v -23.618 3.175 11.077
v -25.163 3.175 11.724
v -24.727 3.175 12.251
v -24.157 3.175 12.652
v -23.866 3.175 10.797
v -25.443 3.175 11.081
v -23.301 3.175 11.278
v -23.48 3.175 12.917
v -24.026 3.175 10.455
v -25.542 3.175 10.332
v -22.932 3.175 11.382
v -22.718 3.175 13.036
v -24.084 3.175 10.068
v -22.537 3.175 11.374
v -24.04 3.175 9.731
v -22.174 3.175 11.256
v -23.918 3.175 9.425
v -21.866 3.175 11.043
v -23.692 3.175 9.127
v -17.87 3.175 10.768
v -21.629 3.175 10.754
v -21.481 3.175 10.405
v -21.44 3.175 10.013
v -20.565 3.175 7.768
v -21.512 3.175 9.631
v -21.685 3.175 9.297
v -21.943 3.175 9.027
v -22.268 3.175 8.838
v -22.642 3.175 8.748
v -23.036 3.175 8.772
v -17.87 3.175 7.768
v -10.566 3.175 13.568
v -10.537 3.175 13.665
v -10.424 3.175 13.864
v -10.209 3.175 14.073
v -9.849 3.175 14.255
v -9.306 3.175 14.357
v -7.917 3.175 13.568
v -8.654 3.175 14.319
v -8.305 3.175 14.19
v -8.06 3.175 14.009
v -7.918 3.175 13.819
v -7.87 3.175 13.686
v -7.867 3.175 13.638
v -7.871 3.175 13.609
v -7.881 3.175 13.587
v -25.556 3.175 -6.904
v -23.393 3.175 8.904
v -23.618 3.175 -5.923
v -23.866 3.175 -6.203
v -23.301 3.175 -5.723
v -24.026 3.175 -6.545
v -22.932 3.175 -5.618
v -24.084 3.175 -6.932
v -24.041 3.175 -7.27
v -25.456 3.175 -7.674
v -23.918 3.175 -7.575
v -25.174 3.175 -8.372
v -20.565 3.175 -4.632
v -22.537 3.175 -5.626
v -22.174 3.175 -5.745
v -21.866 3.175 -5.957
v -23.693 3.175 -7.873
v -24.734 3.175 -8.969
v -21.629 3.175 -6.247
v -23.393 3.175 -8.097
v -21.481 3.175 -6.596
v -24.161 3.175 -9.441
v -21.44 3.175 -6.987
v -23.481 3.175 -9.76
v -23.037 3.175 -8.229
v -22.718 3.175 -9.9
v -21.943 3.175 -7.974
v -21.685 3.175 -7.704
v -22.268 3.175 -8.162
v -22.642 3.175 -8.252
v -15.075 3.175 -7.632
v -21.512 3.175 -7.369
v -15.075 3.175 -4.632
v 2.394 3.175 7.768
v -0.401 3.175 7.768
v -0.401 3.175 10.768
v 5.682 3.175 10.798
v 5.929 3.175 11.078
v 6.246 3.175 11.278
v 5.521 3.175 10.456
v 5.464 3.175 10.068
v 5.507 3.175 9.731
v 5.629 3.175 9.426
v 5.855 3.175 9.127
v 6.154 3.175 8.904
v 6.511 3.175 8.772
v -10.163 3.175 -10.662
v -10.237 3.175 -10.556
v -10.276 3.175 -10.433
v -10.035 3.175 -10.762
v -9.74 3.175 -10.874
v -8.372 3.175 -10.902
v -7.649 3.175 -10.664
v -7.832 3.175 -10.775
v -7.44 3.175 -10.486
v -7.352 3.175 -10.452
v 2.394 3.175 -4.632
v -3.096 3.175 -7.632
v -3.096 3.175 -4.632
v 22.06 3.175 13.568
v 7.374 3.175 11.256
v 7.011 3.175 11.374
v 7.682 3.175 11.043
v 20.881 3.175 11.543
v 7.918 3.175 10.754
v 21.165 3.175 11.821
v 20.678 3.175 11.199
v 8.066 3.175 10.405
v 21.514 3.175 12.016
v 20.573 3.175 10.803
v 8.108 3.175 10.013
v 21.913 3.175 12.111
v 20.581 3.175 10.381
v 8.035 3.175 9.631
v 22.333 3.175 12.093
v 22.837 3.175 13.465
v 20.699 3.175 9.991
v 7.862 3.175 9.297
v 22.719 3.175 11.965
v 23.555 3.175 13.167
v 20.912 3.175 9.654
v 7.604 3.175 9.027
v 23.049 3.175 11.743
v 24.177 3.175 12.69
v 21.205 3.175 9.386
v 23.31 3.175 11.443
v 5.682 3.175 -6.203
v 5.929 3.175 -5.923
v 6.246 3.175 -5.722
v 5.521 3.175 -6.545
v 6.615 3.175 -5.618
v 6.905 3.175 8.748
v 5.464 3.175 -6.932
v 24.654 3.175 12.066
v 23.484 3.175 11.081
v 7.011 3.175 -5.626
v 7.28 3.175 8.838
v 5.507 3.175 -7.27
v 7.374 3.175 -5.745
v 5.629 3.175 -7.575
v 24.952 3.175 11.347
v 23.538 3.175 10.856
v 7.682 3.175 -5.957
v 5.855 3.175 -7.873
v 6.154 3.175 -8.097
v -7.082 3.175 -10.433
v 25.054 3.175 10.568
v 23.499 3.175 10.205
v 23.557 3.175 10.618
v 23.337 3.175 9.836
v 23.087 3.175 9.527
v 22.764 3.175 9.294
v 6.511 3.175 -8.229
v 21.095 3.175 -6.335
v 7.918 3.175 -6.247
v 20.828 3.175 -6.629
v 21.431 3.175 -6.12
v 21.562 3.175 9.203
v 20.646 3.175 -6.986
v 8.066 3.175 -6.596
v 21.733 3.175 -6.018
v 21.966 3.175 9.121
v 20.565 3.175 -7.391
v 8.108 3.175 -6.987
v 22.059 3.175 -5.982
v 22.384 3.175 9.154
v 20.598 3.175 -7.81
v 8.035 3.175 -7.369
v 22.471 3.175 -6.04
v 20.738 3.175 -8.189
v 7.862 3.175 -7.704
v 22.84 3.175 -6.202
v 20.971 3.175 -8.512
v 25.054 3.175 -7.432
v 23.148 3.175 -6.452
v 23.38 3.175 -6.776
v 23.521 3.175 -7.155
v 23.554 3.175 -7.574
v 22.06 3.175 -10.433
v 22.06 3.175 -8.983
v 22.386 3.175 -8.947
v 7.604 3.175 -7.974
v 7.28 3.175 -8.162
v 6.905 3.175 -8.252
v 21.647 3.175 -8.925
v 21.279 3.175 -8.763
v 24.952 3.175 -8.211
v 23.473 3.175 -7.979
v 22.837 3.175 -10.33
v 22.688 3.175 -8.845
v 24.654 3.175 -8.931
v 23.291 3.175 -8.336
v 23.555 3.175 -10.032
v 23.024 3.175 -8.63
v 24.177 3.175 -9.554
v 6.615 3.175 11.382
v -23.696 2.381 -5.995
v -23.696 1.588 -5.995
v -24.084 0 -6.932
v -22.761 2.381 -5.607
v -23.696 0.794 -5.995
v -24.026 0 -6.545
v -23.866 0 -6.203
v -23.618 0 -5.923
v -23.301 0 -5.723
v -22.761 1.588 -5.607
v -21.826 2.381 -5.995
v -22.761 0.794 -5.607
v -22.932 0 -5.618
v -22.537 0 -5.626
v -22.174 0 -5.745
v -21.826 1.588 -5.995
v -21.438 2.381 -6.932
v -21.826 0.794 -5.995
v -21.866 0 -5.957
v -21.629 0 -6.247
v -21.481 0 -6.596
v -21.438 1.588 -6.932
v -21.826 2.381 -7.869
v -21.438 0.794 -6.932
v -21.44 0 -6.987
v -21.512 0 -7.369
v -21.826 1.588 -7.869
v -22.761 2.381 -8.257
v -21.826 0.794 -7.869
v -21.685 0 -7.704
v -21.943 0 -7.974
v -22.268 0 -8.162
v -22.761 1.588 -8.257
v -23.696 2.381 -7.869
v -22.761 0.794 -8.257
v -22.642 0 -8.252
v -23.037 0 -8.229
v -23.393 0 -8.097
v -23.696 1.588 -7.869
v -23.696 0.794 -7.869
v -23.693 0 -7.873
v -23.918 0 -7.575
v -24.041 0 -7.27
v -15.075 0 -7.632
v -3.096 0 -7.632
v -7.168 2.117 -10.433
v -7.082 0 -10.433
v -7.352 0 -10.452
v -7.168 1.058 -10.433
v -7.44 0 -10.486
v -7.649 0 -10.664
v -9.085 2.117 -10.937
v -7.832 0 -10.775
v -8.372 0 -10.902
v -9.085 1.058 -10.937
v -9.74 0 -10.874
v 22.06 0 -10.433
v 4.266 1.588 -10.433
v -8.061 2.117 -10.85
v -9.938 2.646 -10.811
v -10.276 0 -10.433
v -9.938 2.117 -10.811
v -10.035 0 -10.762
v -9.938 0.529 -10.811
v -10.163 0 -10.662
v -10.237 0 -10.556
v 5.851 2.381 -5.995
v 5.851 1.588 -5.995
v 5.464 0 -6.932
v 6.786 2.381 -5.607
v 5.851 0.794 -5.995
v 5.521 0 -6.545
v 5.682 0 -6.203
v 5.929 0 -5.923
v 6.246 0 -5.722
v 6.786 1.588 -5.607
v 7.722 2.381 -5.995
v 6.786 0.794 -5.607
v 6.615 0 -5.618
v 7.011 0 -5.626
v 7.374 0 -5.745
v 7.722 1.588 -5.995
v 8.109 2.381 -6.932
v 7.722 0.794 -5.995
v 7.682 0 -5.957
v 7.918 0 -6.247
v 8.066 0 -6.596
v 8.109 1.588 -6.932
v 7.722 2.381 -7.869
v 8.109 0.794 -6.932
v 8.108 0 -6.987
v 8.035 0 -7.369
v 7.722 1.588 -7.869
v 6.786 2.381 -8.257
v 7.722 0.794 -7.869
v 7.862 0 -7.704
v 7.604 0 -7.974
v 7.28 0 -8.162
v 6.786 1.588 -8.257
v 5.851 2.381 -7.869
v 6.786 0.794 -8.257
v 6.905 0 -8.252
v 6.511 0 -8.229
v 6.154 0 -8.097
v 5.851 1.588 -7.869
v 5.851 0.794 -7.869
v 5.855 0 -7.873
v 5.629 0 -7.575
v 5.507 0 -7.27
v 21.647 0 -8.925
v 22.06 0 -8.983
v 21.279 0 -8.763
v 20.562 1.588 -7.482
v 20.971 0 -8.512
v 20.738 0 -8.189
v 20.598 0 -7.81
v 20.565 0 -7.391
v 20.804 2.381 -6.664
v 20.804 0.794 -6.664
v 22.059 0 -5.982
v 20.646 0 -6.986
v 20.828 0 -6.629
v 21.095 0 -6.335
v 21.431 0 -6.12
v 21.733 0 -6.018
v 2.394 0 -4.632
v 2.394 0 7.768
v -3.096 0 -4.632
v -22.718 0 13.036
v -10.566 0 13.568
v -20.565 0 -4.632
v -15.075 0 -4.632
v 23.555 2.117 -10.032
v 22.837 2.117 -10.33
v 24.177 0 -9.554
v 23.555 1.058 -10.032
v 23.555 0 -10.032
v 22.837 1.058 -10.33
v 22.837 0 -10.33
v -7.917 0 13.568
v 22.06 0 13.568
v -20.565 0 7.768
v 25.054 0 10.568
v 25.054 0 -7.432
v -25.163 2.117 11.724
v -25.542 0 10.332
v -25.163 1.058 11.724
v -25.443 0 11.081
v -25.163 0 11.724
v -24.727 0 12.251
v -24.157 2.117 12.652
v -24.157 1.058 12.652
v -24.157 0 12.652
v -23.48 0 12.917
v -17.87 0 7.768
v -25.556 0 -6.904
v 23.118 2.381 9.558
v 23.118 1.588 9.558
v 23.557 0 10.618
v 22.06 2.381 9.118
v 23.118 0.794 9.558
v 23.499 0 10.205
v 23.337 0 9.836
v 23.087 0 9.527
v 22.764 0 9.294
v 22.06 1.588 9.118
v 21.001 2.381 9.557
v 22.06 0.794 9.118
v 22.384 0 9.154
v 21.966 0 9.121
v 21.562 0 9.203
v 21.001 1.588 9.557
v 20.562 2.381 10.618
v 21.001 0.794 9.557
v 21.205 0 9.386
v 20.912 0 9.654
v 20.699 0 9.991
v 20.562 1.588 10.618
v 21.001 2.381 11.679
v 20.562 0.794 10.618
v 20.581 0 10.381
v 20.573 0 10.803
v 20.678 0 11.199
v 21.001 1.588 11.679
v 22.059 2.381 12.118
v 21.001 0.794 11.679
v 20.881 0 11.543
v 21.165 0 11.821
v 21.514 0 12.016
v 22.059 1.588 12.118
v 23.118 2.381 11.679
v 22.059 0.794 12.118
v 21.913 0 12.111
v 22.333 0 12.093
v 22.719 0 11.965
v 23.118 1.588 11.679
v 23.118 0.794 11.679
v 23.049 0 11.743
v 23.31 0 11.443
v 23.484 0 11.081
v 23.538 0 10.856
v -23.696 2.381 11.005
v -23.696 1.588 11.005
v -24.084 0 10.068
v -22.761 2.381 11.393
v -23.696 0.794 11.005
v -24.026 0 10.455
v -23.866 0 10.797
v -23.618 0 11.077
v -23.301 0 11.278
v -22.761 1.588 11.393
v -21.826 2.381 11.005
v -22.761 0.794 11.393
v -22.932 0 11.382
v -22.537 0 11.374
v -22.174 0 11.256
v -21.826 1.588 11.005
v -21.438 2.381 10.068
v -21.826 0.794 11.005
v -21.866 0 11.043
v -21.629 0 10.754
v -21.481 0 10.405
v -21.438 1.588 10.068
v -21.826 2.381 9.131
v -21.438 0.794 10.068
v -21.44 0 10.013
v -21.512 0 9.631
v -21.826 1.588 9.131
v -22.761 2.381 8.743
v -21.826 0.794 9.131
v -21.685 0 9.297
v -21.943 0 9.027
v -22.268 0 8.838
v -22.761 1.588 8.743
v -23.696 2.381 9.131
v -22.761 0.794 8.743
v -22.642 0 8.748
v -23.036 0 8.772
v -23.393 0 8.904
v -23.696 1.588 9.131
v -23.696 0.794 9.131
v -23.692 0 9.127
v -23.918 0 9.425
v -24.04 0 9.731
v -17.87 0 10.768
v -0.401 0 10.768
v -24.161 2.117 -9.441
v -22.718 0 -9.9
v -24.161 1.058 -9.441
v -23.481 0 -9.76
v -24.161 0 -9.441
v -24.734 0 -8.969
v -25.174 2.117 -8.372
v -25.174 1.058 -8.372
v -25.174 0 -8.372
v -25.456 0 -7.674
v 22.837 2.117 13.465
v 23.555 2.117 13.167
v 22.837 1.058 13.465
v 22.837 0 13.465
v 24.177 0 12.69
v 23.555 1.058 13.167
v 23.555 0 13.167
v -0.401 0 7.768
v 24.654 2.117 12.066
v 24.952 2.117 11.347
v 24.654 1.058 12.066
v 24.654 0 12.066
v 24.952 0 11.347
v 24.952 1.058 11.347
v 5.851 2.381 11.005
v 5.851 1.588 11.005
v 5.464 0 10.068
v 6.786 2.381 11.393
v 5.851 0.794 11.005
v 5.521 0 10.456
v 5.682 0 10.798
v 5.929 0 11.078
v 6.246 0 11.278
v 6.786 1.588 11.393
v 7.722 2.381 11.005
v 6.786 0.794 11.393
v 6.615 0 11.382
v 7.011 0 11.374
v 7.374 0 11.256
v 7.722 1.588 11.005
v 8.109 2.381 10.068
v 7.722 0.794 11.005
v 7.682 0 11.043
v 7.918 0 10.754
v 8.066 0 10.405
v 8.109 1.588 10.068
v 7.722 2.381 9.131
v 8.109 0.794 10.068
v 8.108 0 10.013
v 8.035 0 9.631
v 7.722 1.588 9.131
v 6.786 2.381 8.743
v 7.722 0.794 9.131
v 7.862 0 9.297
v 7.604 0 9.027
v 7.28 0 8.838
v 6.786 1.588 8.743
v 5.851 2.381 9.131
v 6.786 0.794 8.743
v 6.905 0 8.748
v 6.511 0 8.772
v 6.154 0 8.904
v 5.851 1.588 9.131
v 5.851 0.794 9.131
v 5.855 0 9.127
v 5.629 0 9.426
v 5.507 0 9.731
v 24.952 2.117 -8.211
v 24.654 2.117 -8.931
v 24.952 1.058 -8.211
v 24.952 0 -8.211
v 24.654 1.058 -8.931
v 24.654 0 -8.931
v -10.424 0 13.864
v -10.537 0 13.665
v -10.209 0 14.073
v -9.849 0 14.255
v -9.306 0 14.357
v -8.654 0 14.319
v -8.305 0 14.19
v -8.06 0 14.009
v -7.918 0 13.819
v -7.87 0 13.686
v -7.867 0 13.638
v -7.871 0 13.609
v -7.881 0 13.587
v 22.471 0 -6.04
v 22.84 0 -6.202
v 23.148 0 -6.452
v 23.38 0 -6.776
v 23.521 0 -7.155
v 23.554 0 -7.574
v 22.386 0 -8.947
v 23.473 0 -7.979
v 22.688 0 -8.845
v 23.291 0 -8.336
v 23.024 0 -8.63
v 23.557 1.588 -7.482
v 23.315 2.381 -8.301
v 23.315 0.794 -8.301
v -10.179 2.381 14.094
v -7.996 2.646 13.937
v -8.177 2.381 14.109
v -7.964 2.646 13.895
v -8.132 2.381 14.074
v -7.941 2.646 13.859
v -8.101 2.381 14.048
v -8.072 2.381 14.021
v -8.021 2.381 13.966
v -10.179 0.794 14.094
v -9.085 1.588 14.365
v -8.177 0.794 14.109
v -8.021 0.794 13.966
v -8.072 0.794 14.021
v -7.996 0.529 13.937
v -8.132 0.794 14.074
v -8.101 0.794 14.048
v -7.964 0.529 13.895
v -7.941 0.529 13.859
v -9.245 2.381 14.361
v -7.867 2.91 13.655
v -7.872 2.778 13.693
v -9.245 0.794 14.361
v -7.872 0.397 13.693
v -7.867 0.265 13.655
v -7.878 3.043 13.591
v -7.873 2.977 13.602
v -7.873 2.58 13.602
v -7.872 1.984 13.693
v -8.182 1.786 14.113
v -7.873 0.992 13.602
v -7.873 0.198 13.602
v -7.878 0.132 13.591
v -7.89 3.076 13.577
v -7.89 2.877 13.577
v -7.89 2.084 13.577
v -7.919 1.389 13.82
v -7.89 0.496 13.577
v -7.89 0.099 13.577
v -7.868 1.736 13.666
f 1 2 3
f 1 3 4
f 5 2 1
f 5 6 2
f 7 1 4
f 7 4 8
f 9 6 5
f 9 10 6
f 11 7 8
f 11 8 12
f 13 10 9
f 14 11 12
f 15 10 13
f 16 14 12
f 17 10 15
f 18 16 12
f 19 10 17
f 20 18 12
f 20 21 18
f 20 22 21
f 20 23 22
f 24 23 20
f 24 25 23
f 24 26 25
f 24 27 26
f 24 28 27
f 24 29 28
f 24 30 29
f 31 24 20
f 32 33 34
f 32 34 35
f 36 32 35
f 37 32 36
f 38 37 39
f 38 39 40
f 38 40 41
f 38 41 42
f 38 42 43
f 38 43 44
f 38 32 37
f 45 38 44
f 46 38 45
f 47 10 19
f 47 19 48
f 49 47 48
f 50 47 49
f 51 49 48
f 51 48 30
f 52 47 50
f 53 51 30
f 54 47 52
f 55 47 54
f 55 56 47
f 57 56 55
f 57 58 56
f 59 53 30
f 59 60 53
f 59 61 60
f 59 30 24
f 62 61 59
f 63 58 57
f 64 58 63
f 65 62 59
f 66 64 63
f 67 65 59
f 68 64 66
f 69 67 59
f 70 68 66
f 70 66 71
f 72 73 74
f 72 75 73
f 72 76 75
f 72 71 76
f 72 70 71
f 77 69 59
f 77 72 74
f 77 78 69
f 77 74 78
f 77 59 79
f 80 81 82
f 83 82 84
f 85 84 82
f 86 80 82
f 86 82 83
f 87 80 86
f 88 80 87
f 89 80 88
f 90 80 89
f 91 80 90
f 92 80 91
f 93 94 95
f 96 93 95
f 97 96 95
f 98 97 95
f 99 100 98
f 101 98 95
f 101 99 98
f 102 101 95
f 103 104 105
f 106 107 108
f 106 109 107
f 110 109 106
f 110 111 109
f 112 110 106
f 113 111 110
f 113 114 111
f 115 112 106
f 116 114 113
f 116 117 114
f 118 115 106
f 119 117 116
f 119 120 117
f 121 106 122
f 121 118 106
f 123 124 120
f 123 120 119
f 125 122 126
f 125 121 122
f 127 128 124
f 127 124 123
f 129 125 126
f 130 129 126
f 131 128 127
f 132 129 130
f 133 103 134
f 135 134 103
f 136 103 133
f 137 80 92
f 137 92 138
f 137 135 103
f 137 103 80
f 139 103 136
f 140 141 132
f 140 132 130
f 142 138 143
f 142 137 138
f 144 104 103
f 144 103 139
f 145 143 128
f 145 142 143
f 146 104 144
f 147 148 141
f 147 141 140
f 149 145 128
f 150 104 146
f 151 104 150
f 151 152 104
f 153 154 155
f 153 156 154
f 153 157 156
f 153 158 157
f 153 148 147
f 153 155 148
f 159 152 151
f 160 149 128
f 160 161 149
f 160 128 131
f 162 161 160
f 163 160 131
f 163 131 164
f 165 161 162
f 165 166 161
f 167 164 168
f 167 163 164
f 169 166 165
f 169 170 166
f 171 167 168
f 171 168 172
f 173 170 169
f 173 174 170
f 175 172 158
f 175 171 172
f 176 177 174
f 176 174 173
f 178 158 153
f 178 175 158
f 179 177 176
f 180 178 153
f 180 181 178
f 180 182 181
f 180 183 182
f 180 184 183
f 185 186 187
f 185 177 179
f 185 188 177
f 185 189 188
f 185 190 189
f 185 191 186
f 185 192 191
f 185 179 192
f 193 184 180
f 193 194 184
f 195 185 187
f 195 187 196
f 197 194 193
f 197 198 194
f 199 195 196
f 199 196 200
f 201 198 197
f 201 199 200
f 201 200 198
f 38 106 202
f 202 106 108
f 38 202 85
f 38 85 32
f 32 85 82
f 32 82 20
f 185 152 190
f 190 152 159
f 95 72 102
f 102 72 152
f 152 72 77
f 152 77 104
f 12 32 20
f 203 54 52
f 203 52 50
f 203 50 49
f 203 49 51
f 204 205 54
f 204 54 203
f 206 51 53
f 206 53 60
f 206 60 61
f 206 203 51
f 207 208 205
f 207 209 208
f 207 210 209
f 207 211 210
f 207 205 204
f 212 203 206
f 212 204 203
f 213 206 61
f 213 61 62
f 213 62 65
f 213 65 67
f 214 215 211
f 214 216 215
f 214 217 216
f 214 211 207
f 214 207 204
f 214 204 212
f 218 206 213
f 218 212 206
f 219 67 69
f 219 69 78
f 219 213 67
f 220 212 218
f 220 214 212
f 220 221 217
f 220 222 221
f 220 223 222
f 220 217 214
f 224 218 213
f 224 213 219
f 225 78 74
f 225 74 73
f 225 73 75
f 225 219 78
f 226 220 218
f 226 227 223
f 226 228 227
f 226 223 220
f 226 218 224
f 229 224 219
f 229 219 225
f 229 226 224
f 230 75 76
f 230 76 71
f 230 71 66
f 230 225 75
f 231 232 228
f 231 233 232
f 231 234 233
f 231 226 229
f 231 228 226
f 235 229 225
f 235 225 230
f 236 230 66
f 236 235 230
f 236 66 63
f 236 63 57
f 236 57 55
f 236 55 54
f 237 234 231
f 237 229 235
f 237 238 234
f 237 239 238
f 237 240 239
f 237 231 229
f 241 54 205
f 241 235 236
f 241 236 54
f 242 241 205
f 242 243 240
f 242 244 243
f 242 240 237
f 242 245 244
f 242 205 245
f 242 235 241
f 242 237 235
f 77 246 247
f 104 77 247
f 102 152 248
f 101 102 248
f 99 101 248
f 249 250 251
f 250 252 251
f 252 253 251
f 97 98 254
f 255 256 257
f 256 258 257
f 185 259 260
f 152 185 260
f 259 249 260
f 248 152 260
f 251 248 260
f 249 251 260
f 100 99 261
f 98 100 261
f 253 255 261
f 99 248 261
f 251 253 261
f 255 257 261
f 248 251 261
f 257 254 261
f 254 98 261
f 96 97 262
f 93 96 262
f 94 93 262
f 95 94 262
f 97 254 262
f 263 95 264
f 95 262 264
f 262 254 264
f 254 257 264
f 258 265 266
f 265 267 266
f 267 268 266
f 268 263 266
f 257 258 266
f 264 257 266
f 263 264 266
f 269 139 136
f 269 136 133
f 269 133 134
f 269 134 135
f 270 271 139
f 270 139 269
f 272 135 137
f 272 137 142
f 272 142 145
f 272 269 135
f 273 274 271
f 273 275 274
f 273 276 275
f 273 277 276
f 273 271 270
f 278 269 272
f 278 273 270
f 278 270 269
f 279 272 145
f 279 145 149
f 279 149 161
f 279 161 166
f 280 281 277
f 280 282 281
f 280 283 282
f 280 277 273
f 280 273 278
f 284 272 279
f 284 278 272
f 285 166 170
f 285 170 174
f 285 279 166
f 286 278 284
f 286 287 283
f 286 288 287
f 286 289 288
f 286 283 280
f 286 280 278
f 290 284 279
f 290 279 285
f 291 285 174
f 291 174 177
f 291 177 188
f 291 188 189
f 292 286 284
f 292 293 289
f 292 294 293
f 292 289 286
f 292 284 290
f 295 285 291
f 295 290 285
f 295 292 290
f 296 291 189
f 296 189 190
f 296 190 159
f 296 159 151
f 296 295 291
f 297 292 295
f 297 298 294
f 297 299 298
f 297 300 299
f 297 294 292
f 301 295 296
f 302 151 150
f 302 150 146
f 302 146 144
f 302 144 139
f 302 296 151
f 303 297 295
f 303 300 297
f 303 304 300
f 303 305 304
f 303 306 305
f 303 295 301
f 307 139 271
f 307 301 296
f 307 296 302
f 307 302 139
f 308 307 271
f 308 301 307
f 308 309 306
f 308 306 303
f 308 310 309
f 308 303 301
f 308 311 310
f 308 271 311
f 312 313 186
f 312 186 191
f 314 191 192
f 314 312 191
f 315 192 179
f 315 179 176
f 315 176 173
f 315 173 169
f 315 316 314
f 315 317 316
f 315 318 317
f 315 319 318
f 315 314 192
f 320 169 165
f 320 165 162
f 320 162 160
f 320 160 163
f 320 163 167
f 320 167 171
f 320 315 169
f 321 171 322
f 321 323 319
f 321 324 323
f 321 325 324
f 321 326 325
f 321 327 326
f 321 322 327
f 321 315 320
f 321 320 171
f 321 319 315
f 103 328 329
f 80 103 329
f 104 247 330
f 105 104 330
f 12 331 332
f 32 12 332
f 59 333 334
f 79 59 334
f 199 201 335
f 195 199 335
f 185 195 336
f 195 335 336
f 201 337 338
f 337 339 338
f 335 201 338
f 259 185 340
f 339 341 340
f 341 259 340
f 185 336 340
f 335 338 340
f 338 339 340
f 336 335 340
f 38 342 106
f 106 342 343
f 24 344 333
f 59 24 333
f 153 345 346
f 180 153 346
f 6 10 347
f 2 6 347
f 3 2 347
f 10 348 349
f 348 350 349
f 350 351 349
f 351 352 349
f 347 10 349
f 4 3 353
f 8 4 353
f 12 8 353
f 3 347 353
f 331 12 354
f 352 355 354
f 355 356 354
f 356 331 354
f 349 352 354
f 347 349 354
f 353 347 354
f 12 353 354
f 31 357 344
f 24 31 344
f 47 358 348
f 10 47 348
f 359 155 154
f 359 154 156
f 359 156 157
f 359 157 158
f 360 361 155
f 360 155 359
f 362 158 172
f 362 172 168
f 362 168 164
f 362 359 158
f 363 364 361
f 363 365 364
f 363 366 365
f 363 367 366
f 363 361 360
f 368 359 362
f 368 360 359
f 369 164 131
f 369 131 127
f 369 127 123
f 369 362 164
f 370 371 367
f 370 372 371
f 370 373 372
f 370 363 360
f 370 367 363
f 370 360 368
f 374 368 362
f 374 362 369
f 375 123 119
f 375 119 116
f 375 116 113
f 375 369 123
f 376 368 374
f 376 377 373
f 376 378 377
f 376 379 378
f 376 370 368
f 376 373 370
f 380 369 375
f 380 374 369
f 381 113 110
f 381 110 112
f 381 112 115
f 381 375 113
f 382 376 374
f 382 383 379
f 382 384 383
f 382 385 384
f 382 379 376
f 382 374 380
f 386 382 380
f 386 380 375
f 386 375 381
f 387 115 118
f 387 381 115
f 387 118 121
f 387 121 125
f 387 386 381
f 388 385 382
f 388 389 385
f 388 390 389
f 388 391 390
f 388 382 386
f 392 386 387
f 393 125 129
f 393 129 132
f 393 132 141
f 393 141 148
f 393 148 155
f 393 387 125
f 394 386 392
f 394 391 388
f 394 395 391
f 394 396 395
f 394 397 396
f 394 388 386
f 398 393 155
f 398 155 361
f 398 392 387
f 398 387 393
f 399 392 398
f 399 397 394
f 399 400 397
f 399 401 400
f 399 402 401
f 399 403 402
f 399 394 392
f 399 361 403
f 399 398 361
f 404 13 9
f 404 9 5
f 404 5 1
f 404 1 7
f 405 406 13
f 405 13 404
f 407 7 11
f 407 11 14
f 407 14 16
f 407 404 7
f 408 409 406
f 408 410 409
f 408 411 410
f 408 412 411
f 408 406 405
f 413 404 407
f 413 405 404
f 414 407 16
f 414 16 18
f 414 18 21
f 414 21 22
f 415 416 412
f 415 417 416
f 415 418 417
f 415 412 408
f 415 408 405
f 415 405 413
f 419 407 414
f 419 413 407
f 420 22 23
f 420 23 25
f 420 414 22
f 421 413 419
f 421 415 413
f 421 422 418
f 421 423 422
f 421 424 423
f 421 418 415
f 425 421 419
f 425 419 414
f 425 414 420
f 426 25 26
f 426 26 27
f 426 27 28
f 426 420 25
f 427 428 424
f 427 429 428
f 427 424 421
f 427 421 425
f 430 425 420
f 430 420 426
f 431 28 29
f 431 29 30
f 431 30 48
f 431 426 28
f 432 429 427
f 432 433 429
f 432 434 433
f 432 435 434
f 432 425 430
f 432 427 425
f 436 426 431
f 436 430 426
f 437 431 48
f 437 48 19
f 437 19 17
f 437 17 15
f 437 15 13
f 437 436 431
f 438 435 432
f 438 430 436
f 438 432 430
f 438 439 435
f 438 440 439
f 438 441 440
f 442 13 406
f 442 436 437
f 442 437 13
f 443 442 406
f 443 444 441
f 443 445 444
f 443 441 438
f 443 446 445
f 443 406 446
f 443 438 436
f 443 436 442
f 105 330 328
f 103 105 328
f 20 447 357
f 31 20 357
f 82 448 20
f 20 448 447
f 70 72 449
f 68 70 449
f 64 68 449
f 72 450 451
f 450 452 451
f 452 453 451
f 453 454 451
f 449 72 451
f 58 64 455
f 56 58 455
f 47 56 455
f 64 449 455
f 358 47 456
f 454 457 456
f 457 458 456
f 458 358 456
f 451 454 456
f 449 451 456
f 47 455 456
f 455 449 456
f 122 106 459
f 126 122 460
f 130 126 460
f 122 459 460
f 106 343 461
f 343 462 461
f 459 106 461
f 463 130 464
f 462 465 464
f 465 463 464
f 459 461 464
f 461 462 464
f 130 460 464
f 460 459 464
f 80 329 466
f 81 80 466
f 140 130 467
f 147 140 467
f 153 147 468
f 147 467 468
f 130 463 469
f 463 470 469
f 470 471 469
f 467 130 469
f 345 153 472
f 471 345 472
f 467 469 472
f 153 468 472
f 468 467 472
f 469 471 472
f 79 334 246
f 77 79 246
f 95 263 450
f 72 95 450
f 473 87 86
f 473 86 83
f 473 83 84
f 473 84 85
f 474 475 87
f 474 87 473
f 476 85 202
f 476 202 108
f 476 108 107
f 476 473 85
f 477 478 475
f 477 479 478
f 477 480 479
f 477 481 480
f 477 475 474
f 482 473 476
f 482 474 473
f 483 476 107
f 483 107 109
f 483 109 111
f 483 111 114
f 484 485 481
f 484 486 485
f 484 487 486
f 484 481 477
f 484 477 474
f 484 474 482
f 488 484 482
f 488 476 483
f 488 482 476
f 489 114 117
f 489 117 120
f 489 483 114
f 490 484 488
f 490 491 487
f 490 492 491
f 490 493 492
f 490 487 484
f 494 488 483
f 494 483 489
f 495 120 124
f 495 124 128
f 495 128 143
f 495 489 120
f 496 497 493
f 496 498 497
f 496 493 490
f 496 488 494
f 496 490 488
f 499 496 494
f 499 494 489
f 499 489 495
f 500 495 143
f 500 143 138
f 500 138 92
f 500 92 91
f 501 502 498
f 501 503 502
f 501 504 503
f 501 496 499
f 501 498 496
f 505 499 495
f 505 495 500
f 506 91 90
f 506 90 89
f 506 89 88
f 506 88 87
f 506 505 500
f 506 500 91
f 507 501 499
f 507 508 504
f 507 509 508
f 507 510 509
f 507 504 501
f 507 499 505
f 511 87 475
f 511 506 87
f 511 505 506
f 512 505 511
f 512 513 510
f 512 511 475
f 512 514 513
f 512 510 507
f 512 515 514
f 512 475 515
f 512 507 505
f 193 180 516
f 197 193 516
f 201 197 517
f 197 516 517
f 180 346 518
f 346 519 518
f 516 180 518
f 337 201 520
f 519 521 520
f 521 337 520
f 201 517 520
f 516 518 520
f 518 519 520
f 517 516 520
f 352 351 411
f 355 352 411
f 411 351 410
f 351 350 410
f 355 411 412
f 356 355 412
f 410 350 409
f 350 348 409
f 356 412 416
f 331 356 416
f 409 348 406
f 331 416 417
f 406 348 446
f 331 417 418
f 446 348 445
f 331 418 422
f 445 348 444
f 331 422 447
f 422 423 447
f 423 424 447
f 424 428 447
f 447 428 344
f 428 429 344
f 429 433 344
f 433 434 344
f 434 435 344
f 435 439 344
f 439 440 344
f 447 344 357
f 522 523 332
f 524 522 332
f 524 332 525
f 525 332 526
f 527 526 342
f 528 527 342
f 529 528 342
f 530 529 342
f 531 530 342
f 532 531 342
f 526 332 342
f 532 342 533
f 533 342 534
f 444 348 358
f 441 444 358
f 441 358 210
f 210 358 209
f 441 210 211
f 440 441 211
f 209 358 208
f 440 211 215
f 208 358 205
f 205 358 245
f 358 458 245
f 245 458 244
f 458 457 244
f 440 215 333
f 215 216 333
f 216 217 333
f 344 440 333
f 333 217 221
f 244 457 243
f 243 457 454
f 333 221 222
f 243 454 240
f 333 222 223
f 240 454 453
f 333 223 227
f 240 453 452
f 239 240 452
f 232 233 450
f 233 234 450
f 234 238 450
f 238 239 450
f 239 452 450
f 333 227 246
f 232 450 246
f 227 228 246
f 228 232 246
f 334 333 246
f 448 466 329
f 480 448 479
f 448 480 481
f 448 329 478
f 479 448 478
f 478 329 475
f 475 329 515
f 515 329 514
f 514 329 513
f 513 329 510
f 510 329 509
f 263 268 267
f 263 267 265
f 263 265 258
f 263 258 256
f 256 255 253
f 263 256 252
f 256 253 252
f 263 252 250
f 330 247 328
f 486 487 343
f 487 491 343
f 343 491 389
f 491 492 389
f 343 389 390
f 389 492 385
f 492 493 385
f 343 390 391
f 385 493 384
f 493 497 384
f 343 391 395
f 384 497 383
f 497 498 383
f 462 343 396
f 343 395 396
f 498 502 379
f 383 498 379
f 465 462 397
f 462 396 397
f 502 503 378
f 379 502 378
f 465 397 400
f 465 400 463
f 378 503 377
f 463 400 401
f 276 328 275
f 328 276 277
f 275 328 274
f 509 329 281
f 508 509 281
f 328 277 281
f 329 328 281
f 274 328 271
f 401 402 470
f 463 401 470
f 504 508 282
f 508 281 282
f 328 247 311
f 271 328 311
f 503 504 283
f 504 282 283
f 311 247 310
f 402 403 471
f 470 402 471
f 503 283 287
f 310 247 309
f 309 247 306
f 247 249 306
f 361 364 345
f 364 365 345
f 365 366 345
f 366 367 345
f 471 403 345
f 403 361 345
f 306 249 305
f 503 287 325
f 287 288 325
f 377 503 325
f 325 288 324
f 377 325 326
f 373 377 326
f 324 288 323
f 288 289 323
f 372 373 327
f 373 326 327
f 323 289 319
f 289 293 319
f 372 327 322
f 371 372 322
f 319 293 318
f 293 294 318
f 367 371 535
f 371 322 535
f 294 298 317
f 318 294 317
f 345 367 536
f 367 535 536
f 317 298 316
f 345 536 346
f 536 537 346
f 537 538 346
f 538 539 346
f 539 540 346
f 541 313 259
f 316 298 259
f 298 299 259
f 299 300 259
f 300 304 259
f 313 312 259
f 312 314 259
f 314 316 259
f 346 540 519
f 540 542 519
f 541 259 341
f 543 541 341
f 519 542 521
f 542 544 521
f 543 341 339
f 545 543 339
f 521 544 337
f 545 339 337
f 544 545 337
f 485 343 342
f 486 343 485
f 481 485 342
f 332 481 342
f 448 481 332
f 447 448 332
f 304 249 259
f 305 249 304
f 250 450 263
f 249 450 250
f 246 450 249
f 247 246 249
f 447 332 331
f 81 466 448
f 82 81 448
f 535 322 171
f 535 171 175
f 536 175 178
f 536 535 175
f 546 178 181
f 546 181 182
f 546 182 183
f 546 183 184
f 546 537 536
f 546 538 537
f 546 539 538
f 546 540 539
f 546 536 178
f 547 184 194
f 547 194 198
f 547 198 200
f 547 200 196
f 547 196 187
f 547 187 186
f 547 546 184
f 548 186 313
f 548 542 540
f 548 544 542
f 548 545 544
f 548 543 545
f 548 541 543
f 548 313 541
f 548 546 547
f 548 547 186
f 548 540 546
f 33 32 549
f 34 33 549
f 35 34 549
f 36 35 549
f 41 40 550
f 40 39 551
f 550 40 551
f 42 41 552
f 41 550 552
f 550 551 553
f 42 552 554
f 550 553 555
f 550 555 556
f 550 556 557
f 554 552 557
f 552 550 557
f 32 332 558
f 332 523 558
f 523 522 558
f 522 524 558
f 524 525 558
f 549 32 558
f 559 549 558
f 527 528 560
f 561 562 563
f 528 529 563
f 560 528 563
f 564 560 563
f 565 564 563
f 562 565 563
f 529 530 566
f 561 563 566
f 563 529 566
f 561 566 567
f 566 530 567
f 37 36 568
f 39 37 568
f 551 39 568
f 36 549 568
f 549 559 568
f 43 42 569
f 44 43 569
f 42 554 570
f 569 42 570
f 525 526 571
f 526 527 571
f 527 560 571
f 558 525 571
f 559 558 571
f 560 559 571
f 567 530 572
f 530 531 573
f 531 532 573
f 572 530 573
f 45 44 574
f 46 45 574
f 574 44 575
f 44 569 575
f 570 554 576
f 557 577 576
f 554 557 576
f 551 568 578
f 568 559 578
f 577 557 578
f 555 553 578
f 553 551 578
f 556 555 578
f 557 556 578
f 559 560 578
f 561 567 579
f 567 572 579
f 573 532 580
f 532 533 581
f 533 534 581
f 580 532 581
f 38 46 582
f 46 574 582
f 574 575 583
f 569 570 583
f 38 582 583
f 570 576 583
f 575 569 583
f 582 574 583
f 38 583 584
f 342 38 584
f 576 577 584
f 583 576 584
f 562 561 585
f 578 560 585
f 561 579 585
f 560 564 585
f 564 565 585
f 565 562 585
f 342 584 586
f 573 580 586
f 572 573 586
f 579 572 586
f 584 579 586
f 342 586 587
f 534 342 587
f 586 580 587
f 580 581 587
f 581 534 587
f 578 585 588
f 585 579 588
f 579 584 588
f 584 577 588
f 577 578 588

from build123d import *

# Parameters (mm, degrees)
BOSS_EXTRUDE1_DEPTH = 3.175


with BuildPart() as part:
    # Sketch1 → Boss-Extrude1 (new body)
    with BuildSketch(Plane(origin=(0, 0, 0), x_dir=(1, 0, 0), z_dir=(0, 1, 0))):
        with BuildLine():
            Line((-7.916607704, -13.568101426), (22.059516351, -13.568101426))
            add(Edge.make_bspline(
                [(22.059516351, -13.568101426), (22.853650229, -13.568101426), (23.615394255, -13.252239738), (24.176979225, -12.689642236)],
                knots=[3, 3, 3, 3, 4, 4, 4, 4], degree=3))
            add(Edge.make_bspline(
                [(24.176979225, -12.689642236), (24.738559321, -12.127044734), (25.054234873, -11.363730227), (25.054234873, -10.568216226)],
                knots=[4, 4, 4, 4, 5, 5, 5, 5], degree=3))
            Line((25.054234873, -10.568216226), (25.054234874, 7.432384125))
            add(Edge.make_bspline(
                [(25.054234874, 7.432384125), (25.054234874, 8.228152049), (24.738559322, 8.991212634), (24.176979226, 9.553810135)],
                knots=[6, 6, 6, 6, 7, 7, 7, 7], degree=3))
            add(Edge.make_bspline(
                [(24.176979226, 9.553810135), (23.615394256, 10.116476001), (22.85365023, 10.432533016), (22.059516352, 10.432533016)],
                knots=[7, 7, 7, 7, 8, 8, 8, 8], degree=3))
            add(Edge.make_bspline(
                [(22.059516352, 10.432533016), (0.930184666, 10.432533017), (-7.168277805, 10.432533017)],
                knots=[8, 8, 8, 9, 9, 9], degree=2))
            add(Edge.make_bspline(
                [(-7.168277805, 10.432533017), (-7.814831912, 10.432533017), (-7.235489796, 10.936503417), (-9.085259918, 10.936503417)],
                knots=[9, 9, 9, 9, 10, 10, 10, 10], degree=3))
            add(Edge.make_bspline(
                [(-9.085259918, 10.936503417), (-10.19538618, 10.936503417), (-10.2758222, 10.432533017)],
                knots=[10, 10, 10, 11, 11, 11], degree=2))
            Line((-10.2758222, 10.432533017), (-22.718078344, 9.900201281))
            add(Edge.make_bspline(
                [(-22.718078344, 9.900201281), (-24.308841752, 9.816738478), (-25.555955888, 8.500104453), (-25.555955888, 6.904222601)],
                knots=[12, 12, 12, 12, 13, 13, 13, 13], degree=3))
            Line((-25.555955888, 6.904222601), (-25.541956843, -10.332301472))
            add(Edge.make_bspline(
                [(-25.541956843, -10.332301472), (-25.541956843, -11.928183324), (-24.308841753, -12.952385016), (-22.718078345, -13.035847819)],
                knots=[14, 14, 14, 14, 15, 15, 15, 15], degree=3))
            Line((-22.718078345, -13.035847819), (-10.566326768, -13.568101426))
            add(Edge.make_bspline(
                [(-10.566326768, -13.568101426), (-10.566131795, -13.568101426), (-10.44372301, -14.36476785), (-9.085259919, -14.36476785)],
                knots=[0, 0, 0, 0, 1, 1, 1, 1], degree=3))
            add(Edge.make_bspline(
                [(-9.085259919, -14.36476785), (-7.973276542, -14.36476785), (-7.747619922, -13.568101426), (-7.916607704, -13.568101426)],
                knots=[1, 1, 1, 1, 2, 2, 2, 2], degree=3))
        make_face()
        Polygon((-0.350718254, -7.76802257), (-0.400743394, -7.76802257), (-0.400743394, -10.768103096), (-17.869631753, -10.768103096), (-17.869631753, -7.76802257), (-20.564779474, -7.76802257), (-20.564779474, 4.632385798), (-15.074696963, 4.632385798), (-15.074696963, 7.632466324), (-3.095696143, 7.632466324), (-3.095696143, 4.632385798), (2.394386368, 4.632385798), (2.394386368, -7.76802257), align=None, mode=Mode.SUBTRACT)
        with BuildLine():
            add(Edge.make_bspline(
                [(-21.438394006, -10.068152345), (-21.438394006, -9.336265792), (-22.030575079, -8.743197433), (-22.76101135, -8.743197433), (-23.491515862, -8.743197433), (-24.083765176, -9.336265792), (-24.083765176, -10.068152345)],
                knots=[2, 2, 2, 2, 3, 3, 3, 4, 4, 4, 4], degree=3))
            add(Edge.make_bspline(
                [(-24.083765176, -10.068152345), (-24.083765176, -10.799853338), (-23.491515862, -11.393175621), (-22.761138083, -11.393175621), (-22.030575079, -11.393175621), (-21.438394006, -10.799853339), (-21.438394006, -10.068152345)],
                knots=[0, 0, 0, 0, 1, 1, 1, 2, 2, 2, 2], degree=3))
        make_face(mode=Mode.SUBTRACT)
        with BuildLine():
            add(Edge.make_bspline(
                [(-21.438394005, 6.932378845), (-21.438394005, 7.664275164), (-22.030575078, 8.257343524), (-22.76101135, 8.257343524), (-23.491515861, 8.257343524), (-24.083765175, 7.664275165), (-24.083765175, 6.932378845)],
                knots=[2, 2, 2, 2, 3, 3, 3, 4, 4, 4, 4], degree=3))
            add(Edge.make_bspline(
                [(-24.083765175, 6.932378845), (-24.083765176, 6.200619254), (-23.491515862, 5.607365335), (-22.761138082, 5.607365335), (-22.030575078, 5.607365335), (-21.438394005, 6.200619254), (-21.438394005, 6.932378845)],
                knots=[0, 0, 0, 0, 1, 1, 1, 2, 2, 2, 2], degree=3))
        make_face(mode=Mode.SUBTRACT)
        with BuildLine():
            add(Edge.make_bspline(
                [(22.059516352, 8.982706186), (21.232412577, 8.982706186), (20.562027922, 8.310843315), (20.562027922, 7.482436415)],
                knots=[3, 3, 3, 3, 4, 4, 4, 4], degree=3))
            add(Edge.make_bspline(
                [(20.562027922, 7.482436415), (20.562027922, 6.654029515), (21.232412577, 5.98236197), (22.059321379, 5.98236197)],
                knots=[0, 0, 0, 0, 1, 1, 1, 1], degree=3))
            add(Edge.make_bspline(
                [(22.059321379, 5.98236197), (22.886235056, 5.982235008), (23.556873176, 6.654029515), (23.556873176, 7.482436415), (23.556873176, 8.310843315), (22.886235056, 8.98251086), (22.059516352, 8.982706186)],
                knots=[1, 1, 1, 1, 2, 2, 2, 3, 3, 3, 3], degree=3))
        make_face(mode=Mode.SUBTRACT)
        with BuildLine():
            add(Edge.make_bspline(
                [(23.556683077, -10.618268517), (23.556873175, -9.789666291), (22.886235055, -9.118194072), (22.059516351, -9.118194072), (21.232412576, -9.118194072), (20.562154653, -9.789666291), (20.562154653, -10.618082957)],
                knots=[2, 2, 2, 2, 3, 3, 3, 4, 4, 4, 4], degree=3))
            add(Edge.make_bspline(
                [(20.562154653, -10.618082957), (20.562154653, -11.446489857), (21.232412576, -12.118147636), (22.059321378, -12.118147636), (22.886235055, -12.118147636), (23.556683077, -11.446489858), (23.556683077, -10.618268517)],
                knots=[0, 0, 0, 0, 1, 1, 1, 2, 2, 2, 2], degree=3))
        make_face(mode=Mode.SUBTRACT)
        with BuildLine():
            add(Edge.make_bspline(
                [(8.109101892, -10.068347672), (8.109101892, -9.336451353), (7.516852578, -8.743197434), (6.786479673, -8.743197434), (6.055911795, -8.743197434), (5.463725847, -9.336451353), (5.463725847, -10.068152346)],
                knots=[2, 2, 2, 2, 3, 3, 3, 4, 4, 4, 4], degree=3))
            add(Edge.make_bspline(
                [(5.463725847, -10.068152346), (5.463725847, -10.8000389), (6.055911795, -11.393302585), (6.7862847, -11.393302585), (7.516852578, -11.393302585), (8.109101892, -10.8000389), (8.109101892, -10.068347672)],
                knots=[0, 0, 0, 0, 1, 1, 1, 2, 2, 2, 2], degree=3))
        make_face(mode=Mode.SUBTRACT)
        with BuildLine():
            add(Edge.make_bspline(
                [(8.109101892, 6.932193284), (8.109101892, 7.664079837), (7.516852578, 8.257343522), (6.786479673, 8.257343522), (6.055911795, 8.257343522), (5.463725848, 7.664079837), (5.463725848, 6.932378844)],
                knots=[2, 2, 2, 2, 3, 3, 3, 4, 4, 4, 4], degree=3))
            add(Edge.make_bspline(
                [(5.463725848, 6.932378844), (5.463725847, 6.20049229), (6.055911795, 5.607170007), (6.7862847, 5.607170007), (7.516852578, 5.607170007), (8.109101892, 6.20049229), (8.109101892, 6.932193284)],
                knots=[0, 0, 0, 0, 1, 1, 1, 2, 2, 2, 2], degree=3))
        make_face(mode=Mode.SUBTRACT)
    extrude(amount=BOSS_EXTRUDE1_DEPTH)


solid = part.part
